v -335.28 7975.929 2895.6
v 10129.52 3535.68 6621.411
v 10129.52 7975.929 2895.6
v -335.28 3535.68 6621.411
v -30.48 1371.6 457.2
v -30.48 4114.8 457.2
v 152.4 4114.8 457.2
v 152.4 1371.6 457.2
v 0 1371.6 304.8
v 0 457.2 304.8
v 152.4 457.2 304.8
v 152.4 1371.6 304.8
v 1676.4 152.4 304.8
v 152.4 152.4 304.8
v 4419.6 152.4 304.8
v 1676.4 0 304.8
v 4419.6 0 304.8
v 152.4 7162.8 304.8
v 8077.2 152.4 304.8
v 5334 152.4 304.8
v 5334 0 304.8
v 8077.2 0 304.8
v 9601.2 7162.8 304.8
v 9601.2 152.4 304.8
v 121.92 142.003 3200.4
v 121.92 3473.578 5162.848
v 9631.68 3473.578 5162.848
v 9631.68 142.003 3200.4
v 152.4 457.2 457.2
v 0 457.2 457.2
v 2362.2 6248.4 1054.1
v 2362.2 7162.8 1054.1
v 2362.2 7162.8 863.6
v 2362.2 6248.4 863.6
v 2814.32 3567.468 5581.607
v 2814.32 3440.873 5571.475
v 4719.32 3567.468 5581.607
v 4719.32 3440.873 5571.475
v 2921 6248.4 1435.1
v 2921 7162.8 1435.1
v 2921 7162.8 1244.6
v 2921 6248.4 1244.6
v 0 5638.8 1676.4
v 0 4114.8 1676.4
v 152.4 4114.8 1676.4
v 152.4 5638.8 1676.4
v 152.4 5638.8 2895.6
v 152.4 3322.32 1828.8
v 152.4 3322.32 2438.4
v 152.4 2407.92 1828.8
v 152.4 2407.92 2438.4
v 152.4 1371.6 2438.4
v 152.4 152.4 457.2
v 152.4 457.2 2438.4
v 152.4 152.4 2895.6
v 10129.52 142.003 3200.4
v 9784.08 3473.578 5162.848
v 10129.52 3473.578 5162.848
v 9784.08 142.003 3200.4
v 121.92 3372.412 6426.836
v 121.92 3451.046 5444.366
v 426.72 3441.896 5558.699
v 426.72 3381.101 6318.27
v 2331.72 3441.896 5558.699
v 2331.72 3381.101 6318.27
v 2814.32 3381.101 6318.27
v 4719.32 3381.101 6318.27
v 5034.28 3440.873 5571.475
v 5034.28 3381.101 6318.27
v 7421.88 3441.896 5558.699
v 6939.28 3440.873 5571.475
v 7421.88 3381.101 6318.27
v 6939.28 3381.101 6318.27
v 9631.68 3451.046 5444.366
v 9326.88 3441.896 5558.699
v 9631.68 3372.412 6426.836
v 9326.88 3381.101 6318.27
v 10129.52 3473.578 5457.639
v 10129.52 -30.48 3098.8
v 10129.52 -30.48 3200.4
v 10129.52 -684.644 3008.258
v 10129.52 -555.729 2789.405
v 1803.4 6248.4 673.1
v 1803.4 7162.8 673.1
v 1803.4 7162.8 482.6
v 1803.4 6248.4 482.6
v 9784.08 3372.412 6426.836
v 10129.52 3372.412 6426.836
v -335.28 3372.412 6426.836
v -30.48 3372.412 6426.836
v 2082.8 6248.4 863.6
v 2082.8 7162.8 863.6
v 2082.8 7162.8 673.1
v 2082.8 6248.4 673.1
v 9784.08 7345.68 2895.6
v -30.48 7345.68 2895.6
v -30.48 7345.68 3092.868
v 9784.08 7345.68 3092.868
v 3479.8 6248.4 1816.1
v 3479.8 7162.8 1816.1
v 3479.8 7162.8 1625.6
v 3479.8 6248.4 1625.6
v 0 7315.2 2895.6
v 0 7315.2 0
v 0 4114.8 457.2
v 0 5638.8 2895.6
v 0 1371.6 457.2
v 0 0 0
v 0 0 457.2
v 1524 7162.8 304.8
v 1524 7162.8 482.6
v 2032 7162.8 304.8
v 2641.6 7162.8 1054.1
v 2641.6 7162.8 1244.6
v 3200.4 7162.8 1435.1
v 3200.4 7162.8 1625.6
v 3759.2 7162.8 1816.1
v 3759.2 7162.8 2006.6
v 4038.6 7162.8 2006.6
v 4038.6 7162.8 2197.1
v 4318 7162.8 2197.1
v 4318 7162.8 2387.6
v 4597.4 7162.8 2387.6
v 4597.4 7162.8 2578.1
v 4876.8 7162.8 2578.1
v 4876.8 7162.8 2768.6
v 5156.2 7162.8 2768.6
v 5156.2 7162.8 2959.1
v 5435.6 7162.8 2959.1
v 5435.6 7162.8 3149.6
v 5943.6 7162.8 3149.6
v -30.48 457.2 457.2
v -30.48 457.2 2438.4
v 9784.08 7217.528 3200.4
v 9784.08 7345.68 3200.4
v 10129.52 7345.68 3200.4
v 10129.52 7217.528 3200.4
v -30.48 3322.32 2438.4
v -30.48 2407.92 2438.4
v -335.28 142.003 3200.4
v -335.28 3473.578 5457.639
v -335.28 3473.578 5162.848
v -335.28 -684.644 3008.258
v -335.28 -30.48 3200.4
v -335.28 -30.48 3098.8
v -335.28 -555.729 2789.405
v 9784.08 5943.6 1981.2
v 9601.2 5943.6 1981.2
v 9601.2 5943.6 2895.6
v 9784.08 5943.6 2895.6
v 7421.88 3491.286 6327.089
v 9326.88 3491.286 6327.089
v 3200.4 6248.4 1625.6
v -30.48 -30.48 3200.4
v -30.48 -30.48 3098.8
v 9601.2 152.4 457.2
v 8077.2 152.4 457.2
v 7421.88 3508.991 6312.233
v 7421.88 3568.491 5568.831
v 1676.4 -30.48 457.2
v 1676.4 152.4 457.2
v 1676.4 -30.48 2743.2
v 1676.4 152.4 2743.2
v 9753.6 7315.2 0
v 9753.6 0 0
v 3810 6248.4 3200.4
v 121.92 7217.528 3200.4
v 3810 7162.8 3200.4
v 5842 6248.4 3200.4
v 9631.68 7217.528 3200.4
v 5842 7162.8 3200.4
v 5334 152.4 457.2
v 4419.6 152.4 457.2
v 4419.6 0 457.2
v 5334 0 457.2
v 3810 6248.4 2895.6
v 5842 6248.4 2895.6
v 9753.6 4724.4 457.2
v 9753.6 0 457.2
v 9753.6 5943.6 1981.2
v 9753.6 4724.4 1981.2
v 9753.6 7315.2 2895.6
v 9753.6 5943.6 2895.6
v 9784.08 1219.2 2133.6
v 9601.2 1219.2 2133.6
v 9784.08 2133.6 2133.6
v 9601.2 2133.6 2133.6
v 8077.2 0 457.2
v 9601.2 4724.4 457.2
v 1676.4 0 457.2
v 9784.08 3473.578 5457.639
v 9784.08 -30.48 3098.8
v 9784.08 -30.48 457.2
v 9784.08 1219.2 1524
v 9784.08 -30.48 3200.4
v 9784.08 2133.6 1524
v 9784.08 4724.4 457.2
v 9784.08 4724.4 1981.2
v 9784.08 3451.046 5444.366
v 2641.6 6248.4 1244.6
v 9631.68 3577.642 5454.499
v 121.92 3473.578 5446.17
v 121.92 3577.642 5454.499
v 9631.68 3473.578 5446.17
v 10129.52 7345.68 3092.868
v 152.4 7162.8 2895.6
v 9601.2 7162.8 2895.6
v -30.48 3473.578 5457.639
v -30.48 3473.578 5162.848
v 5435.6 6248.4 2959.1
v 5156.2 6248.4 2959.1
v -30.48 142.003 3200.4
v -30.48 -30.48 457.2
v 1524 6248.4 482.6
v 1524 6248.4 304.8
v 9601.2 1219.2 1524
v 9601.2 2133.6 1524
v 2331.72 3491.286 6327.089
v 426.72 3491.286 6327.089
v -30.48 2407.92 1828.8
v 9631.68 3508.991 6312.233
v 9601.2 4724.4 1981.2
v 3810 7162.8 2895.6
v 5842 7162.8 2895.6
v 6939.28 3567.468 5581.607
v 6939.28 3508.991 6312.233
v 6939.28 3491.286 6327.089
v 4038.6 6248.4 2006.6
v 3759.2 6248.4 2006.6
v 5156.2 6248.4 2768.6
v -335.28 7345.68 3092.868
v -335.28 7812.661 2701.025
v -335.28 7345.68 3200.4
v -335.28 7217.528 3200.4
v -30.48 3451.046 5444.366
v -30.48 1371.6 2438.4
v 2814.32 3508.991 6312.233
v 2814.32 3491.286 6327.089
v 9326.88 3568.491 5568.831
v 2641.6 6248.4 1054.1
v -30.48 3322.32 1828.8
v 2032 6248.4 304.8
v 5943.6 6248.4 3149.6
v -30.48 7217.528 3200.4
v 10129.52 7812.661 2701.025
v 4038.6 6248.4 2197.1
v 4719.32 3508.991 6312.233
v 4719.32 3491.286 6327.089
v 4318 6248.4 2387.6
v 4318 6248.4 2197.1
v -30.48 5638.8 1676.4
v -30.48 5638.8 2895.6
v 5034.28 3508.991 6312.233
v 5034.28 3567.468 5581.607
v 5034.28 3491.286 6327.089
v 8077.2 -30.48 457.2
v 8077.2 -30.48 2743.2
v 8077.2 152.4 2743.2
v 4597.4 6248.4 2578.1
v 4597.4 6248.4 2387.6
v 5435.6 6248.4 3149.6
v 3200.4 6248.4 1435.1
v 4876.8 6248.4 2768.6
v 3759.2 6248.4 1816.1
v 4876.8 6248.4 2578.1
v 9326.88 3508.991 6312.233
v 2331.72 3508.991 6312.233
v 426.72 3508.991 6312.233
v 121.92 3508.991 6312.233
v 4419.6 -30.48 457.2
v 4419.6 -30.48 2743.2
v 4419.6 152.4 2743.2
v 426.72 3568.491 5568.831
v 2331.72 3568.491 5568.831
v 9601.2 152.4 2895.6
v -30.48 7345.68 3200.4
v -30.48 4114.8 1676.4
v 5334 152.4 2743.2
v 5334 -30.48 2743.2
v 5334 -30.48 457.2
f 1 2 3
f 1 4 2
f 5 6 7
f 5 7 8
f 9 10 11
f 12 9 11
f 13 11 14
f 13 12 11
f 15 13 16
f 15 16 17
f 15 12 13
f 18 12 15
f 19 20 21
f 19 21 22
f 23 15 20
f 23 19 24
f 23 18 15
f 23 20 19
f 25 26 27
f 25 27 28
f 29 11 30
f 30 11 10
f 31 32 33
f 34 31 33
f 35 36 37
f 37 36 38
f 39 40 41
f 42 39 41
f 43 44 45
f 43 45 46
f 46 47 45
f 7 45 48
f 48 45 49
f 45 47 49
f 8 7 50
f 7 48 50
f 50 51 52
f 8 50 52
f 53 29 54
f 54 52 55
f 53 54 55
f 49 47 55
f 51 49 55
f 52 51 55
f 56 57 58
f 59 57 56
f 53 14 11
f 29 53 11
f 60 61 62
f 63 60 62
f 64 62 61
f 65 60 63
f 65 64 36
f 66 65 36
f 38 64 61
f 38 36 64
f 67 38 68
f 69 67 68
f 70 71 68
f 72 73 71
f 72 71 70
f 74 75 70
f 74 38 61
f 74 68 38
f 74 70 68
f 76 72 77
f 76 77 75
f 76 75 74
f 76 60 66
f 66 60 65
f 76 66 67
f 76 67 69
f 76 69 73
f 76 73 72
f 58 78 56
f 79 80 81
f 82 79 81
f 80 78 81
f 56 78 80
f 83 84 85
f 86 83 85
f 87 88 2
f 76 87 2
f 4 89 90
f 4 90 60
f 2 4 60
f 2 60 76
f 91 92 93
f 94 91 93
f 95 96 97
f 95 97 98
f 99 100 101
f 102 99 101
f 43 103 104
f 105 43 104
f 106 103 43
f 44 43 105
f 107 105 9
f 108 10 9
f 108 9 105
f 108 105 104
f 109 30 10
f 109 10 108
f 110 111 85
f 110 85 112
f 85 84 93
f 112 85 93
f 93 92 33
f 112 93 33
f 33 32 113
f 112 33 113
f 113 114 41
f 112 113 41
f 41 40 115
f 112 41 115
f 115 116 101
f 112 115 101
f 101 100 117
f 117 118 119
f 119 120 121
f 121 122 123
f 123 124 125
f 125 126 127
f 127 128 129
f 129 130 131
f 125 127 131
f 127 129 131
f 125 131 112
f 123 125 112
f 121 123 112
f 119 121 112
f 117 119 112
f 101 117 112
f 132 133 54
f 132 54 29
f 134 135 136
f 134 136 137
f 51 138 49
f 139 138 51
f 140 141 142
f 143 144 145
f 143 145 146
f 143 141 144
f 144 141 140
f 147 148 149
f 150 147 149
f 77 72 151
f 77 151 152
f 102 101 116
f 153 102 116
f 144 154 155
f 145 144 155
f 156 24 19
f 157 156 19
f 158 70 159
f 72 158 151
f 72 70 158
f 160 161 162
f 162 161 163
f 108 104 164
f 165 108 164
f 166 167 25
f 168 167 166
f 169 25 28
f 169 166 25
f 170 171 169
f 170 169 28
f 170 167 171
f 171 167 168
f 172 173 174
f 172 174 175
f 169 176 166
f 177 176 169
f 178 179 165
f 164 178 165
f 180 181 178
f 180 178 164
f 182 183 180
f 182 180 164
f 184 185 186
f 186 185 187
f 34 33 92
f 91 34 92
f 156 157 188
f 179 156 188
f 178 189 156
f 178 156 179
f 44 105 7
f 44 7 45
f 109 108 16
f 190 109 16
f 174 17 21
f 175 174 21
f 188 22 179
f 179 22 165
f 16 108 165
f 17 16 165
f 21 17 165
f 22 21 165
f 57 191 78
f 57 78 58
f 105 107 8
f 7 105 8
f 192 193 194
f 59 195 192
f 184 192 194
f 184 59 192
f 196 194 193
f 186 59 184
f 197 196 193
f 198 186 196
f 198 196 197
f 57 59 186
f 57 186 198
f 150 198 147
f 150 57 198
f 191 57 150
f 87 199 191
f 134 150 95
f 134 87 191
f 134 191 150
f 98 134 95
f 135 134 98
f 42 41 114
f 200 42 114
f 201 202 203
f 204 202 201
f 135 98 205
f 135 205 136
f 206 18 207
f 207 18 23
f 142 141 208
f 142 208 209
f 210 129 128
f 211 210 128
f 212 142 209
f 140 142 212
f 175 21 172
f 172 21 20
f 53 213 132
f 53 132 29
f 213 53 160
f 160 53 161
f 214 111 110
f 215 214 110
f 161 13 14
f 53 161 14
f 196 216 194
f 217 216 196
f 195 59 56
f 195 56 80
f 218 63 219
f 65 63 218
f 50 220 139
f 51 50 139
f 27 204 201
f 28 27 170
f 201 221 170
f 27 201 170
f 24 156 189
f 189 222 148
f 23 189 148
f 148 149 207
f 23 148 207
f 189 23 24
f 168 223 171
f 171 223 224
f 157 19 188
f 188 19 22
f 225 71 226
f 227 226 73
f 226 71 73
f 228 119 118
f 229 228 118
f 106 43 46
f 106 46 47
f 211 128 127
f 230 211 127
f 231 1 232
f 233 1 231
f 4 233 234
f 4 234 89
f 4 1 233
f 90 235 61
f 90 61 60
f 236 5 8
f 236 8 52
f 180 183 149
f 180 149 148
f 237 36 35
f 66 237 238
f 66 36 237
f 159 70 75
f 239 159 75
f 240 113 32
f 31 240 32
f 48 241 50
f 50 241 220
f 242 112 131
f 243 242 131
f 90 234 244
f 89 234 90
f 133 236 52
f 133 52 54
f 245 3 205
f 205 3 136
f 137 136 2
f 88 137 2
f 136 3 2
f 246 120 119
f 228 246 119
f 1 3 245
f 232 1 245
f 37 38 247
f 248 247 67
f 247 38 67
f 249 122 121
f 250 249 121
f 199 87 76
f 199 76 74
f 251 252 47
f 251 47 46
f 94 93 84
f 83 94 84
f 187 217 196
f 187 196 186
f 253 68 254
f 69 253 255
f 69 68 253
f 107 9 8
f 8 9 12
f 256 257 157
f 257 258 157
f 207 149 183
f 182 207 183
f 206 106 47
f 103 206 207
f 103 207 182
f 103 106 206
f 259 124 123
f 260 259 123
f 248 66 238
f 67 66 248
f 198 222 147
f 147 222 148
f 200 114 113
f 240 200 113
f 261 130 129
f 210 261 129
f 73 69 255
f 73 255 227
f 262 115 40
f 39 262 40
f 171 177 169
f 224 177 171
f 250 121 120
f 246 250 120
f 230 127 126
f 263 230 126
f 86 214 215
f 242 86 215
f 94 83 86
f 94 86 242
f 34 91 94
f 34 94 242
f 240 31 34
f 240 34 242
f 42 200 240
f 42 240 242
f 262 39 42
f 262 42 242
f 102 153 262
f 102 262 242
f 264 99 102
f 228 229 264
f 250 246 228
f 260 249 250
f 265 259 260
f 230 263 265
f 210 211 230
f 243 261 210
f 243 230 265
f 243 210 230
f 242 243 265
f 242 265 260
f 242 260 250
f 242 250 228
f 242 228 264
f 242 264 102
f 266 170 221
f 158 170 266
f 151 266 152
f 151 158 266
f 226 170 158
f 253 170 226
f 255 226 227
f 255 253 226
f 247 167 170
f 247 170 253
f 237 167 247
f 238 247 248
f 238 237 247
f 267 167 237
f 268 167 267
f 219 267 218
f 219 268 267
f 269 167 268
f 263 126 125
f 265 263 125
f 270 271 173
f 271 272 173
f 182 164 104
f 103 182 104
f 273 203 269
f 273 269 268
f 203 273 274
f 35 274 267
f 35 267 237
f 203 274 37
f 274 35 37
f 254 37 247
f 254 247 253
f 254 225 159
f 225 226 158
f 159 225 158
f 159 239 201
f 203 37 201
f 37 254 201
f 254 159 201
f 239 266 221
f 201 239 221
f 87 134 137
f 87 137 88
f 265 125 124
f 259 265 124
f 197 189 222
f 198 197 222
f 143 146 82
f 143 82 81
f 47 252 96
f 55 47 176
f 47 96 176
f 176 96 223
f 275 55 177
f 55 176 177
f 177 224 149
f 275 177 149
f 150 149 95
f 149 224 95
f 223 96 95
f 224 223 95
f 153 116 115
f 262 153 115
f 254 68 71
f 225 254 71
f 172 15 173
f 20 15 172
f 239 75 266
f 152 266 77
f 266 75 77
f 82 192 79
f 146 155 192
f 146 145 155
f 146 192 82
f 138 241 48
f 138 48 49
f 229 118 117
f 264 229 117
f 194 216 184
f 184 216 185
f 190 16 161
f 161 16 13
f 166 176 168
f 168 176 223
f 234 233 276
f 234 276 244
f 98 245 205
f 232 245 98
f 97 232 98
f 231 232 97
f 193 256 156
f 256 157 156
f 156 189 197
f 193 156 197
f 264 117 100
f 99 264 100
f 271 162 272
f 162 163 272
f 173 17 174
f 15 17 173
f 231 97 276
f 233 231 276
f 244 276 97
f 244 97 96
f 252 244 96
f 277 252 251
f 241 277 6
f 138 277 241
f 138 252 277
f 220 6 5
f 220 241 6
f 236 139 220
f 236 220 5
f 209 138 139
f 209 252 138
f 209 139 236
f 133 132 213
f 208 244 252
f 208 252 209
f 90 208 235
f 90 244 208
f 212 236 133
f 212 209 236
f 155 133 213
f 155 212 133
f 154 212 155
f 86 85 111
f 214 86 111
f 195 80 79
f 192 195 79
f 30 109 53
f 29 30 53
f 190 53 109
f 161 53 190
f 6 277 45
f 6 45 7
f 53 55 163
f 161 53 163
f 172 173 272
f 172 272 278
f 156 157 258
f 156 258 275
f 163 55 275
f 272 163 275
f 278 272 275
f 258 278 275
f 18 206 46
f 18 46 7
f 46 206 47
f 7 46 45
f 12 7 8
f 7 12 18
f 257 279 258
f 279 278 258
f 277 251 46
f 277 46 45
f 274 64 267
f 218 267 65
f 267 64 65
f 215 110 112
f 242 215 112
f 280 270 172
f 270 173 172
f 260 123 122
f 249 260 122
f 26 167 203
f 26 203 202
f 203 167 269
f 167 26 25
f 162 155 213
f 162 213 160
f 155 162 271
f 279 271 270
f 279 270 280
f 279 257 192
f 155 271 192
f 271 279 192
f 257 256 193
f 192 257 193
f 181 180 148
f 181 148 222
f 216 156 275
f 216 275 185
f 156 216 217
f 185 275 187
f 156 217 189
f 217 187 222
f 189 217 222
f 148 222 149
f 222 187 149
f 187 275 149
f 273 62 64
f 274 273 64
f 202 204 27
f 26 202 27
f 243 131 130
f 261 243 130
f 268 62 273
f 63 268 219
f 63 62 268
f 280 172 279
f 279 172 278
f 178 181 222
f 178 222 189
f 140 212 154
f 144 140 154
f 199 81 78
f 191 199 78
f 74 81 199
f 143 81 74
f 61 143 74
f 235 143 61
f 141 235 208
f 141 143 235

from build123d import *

# Parameters (mm, degrees)
F0_W           = 9753.6
F0_H           = 7315.2
F1_DEPTH       = 304.8
F2_W           = 914.4
F2_H           = 152.4
F3_DEPTH       = 152.4
F5_DEPTH       = 2438.4
F7_DEPTH       = 152.4
F9_DEPTH       = 152.4
F10_W          = 914.4
F10_H          = 609.6
F11_DEPTH      = 152.4
F11_DEPTH_BACK = 30.48
F13_DEPTH      = 152.4
F13_DEPTH_BACK = 30.48
F14_W          = 914.4
F14_H          = 609.6
F15_DEPTH      = 182.88
F16_W          = 9814.56
F16_H          = 7376.16
F16_W_2        = 2032
F16_H_2        = 914.4
F17_DEPTH      = 304.8
F19_DEPTH      = 914.4
F24_DEPTH      = 304.8
F24_DEPTH_BACK = 10160
F26_DEPTH      = 152.4
F28_DEPTH      = 152.4
F29_W          = 9814.56
F29_H          = 985.611441973
F29_W_2        = 1905
F29_H_2        = 762
F29_H_3        = 749.1830940247
F30_DEPTH      = 127


with BuildPart() as f1:
    # F0 (on Top) → F1 (new body)
    with BuildSketch(Plane.XY):
        with Locations((4876.8, 3657.6)):
            Rectangle(F0_W, F0_H)
    extrude(amount=F1_DEPTH)

    # F2 (on face) → F3 (join)
    with BuildSketch(Plane.XY.offset(304.8)):
        with Locations((4876.8, 76.2)):
            Rectangle(F2_W, F2_H)
        Polygon((8077.2, 152.4), (8077.2, 0), (9753.6, 0), (9753.6, 7315.2), (0, 7315.2), (0, 1371.6), (152.4, 1371.6), (152.4, 7162.8), (9601.2, 7162.8), (9601.2, 152.4), align=None)
        Polygon((0, 0), (1676.4, 0), (1676.4, 152.4), (152.4, 152.4), (152.4, 457.2), (0, 457.2), align=None)
    extrude(amount=F3_DEPTH)

    # F4 (on face) → F5 (join)
    with BuildSketch(Plane.XY.offset(457.2)):
        Polygon((0, 7315.2), (0, 7162.8), (9601.2, 7162.8), (9753.6, 7162.8), (9753.6, 7315.2), align=None)
    extrude(amount=F5_DEPTH)

    # F6 (on face) → F7 (join)
    with BuildSketch(Plane.YZ.offset(9753.6)):
        Polygon((4724.4, 1981.2), (4724.4, 457.2), (7162.8, 457.2), (7162.8, 2895.6), (5943.6, 2895.6), (5943.6, 1981.2), align=None)
    extrude(amount=-F7_DEPTH)

    # F8 (on face) → F9 (join)
    with BuildSketch(Plane(origin=(0, 0, 0), x_dir=(0, -1, 0), z_dir=(-1, 0, 0))):
        Polygon((-7162.8, 457.2), (-4114.8, 457.2), (-4114.8, 1676.4), (-5638.8, 1676.4), (-5638.8, 2895.6), (-7162.8, 2895.6), align=None)
    extrude(amount=-F9_DEPTH)


with BuildPart() as f11:
    # F10 (on face) → F11 (new body, two sides)
    with BuildSketch(Plane.YZ.offset(9753.6)) as f11_sk:
        Polygon((5943.6, 1981.2), (5943.6, 2895.6), (0, 2895.6), (0, 457.2), (4724.4, 457.2), (4724.4, 1981.2), align=None)
        with Locations((1676.4, 1828.8)):
            Rectangle(F10_W, F10_H, mode=Mode.SUBTRACT)
    extrude(amount=-F11_DEPTH)
    extrude(f11_sk.sketch, amount=F11_DEPTH_BACK)

    # F12 (on face) → F13 (join, two sides)
    with BuildSketch(Plane.XZ) as f13_sk:
        Polygon((-30.48, 457.2), (0, 457.2), (1676.4, 457.2), (1676.4, 2743.2), (4419.6, 2743.2), (4419.6, 457.2), (5334, 457.2), (5334, 2743.2), (8077.2, 2743.2), (8077.2, 457.2), (9601.2, 457.2), (9753.6, 457.2), (9784.08, 457.2), (9784.08, 2895.6), (9601.2, 2895.6), (152.4, 2895.6), (-30.48, 2895.6), align=None)
    extrude(amount=-F13_DEPTH)
    extrude(f13_sk.sketch, amount=F13_DEPTH_BACK)

    # F14 (on face) → F15 (join)
    with BuildSketch(Plane(origin=(-30.48, 0, 0), x_dir=(0, -1, 0), z_dir=(-1, 0, 0))):
        Polygon((30.48, 2895.6), (-5638.8, 2895.6), (-5638.8, 1676.4), (-4114.8, 1676.4), (-4114.8, 457.2), (-1371.6, 457.2), (-1371.6, 2438.4), (-457.2, 2438.4), (-457.2, 457.2), (30.48, 457.2), align=None)
        with Locations((-2865.12, 2133.6)):
            Rectangle(F14_W, F14_H, mode=Mode.SUBTRACT)
    extrude(amount=-F15_DEPTH)

    # F16 (on face) → F17 (join)
    with BuildSketch(Plane.XY.offset(2895.6)):
        with Locations((4876.8, 3657.6)):
            Rectangle(F16_W, F16_H)
        with Locations((4826, 6705.6)):
            Rectangle(F16_W_2, F16_H_2, mode=Mode.SUBTRACT)
    extrude(amount=F17_DEPTH)

    # F23 (on face) → F24 (join, two sides)
    with BuildSketch(Plane(origin=(-30.48, 0, 0), x_dir=(0, -1, 0), z_dir=(-1, 0, 0))) as f24_sk:
        Polygon((-7975.9287453857, 2895.6), (-7812.6606925253, 2701.0247114478), (-7345.68, 3092.8680383127), (-7345.68, 3200.4), (-7217.5283983405, 3200.4), (-3372.4119471396, 6426.8357960363), (-3535.68, 6621.4110845885), align=None)
        Polygon((684.6438803972, 3008.2584206913), (-3473.5784478936, 5457.6385603397), (-3473.5784478936, 5162.8481659781), (-142.0025729235, 3200.4), (30.48, 3200.4), (30.48, 3098.8), (555.7291362052, 2789.4046139392), align=None)
    extrude(amount=F24_DEPTH)
    extrude(f24_sk.sketch, amount=-F24_DEPTH_BACK)

    # F25 (on face) → F26 (join)
    with BuildSketch(Plane(origin=(-30.48, 0, 0), x_dir=(0, -1, 0), z_dir=(-1, 0, 0))):
        Polygon((-3372.4119471396, 6426.8357960363), (-7217.5283983405, 3200.4), (-142.0025729235, 3200.4), (-3473.5784478936, 5162.8481659781), align=None)
    extrude(amount=-F26_DEPTH)

    # F27 (on face) → F28 (join)
    with BuildSketch(Plane.YZ.offset(9784.08)):
        Polygon((142.0025729235, 3200.4), (7217.5283983404, 3200.4), (3372.4119471396, 6426.8357960363), (3473.5784478936, 5162.8481659781), align=None)
    extrude(amount=-F28_DEPTH)

    # F29 (on face) → F30 (join)
    with BuildSketch(Plane(origin=(0, 3862.0598735135, 309.1098946023), x_dir=(1, 0, 0), z_dir=(0, -0.9968123007, -0.0797824361))):
        with Locations((4876.8, 5644.4840144651)):
            Rectangle(F29_W, F29_H)
        with Locations((1379.22, 5647.3764953613)):
            Rectangle(F29_W_2, F29_H_2, mode=Mode.SUBTRACT)
        with Locations((3766.82, 5653.784948349)):
            Rectangle(F29_W_2, F29_H_3, mode=Mode.SUBTRACT)
        with Locations((5986.78, 5653.784948349)):
            Rectangle(F29_W_2, F29_H_3, mode=Mode.SUBTRACT)
        with Locations((8374.38, 5647.3764953613)):
            Rectangle(F29_W_2, F29_H_2, mode=Mode.SUBTRACT)
    extrude(amount=-F30_DEPTH)


with BuildPart() as f19:
    # F18 (on face) → F19 (new body)
    with BuildSketch(Plane.XZ.offset(-7162.8)):
        Polygon((1524, 482.6), (1524, 304.8), (2032, 304.8), (5943.6, 3149.6), (5435.6, 3149.6), (5435.6, 2959.1), (5156.2, 2959.1), (5156.2, 2768.6), (4876.8, 2768.6), (4876.8, 2578.1), (4597.4, 2578.1), (4597.4, 2387.6), (4318, 2387.6), (4318, 2197.1), (4038.6, 2197.1), (4038.6, 2006.6), (3759.2, 2006.6), (3759.2, 1816.1), (3479.8, 1816.1), (3479.8, 1625.6), (3200.4, 1625.6), (3200.4, 1435.1), (2921, 1435.1), (2921, 1244.6), (2641.6, 1244.6), (2641.6, 1054.1), (2362.2, 1054.1), (2362.2, 863.6), (2082.8, 863.6), (2082.8, 673.1), (1803.4, 673.1), (1803.4, 482.6), align=None)
    extrude(amount=F19_DEPTH)


solid = Compound([f1.part, f11.part, f19.part])
